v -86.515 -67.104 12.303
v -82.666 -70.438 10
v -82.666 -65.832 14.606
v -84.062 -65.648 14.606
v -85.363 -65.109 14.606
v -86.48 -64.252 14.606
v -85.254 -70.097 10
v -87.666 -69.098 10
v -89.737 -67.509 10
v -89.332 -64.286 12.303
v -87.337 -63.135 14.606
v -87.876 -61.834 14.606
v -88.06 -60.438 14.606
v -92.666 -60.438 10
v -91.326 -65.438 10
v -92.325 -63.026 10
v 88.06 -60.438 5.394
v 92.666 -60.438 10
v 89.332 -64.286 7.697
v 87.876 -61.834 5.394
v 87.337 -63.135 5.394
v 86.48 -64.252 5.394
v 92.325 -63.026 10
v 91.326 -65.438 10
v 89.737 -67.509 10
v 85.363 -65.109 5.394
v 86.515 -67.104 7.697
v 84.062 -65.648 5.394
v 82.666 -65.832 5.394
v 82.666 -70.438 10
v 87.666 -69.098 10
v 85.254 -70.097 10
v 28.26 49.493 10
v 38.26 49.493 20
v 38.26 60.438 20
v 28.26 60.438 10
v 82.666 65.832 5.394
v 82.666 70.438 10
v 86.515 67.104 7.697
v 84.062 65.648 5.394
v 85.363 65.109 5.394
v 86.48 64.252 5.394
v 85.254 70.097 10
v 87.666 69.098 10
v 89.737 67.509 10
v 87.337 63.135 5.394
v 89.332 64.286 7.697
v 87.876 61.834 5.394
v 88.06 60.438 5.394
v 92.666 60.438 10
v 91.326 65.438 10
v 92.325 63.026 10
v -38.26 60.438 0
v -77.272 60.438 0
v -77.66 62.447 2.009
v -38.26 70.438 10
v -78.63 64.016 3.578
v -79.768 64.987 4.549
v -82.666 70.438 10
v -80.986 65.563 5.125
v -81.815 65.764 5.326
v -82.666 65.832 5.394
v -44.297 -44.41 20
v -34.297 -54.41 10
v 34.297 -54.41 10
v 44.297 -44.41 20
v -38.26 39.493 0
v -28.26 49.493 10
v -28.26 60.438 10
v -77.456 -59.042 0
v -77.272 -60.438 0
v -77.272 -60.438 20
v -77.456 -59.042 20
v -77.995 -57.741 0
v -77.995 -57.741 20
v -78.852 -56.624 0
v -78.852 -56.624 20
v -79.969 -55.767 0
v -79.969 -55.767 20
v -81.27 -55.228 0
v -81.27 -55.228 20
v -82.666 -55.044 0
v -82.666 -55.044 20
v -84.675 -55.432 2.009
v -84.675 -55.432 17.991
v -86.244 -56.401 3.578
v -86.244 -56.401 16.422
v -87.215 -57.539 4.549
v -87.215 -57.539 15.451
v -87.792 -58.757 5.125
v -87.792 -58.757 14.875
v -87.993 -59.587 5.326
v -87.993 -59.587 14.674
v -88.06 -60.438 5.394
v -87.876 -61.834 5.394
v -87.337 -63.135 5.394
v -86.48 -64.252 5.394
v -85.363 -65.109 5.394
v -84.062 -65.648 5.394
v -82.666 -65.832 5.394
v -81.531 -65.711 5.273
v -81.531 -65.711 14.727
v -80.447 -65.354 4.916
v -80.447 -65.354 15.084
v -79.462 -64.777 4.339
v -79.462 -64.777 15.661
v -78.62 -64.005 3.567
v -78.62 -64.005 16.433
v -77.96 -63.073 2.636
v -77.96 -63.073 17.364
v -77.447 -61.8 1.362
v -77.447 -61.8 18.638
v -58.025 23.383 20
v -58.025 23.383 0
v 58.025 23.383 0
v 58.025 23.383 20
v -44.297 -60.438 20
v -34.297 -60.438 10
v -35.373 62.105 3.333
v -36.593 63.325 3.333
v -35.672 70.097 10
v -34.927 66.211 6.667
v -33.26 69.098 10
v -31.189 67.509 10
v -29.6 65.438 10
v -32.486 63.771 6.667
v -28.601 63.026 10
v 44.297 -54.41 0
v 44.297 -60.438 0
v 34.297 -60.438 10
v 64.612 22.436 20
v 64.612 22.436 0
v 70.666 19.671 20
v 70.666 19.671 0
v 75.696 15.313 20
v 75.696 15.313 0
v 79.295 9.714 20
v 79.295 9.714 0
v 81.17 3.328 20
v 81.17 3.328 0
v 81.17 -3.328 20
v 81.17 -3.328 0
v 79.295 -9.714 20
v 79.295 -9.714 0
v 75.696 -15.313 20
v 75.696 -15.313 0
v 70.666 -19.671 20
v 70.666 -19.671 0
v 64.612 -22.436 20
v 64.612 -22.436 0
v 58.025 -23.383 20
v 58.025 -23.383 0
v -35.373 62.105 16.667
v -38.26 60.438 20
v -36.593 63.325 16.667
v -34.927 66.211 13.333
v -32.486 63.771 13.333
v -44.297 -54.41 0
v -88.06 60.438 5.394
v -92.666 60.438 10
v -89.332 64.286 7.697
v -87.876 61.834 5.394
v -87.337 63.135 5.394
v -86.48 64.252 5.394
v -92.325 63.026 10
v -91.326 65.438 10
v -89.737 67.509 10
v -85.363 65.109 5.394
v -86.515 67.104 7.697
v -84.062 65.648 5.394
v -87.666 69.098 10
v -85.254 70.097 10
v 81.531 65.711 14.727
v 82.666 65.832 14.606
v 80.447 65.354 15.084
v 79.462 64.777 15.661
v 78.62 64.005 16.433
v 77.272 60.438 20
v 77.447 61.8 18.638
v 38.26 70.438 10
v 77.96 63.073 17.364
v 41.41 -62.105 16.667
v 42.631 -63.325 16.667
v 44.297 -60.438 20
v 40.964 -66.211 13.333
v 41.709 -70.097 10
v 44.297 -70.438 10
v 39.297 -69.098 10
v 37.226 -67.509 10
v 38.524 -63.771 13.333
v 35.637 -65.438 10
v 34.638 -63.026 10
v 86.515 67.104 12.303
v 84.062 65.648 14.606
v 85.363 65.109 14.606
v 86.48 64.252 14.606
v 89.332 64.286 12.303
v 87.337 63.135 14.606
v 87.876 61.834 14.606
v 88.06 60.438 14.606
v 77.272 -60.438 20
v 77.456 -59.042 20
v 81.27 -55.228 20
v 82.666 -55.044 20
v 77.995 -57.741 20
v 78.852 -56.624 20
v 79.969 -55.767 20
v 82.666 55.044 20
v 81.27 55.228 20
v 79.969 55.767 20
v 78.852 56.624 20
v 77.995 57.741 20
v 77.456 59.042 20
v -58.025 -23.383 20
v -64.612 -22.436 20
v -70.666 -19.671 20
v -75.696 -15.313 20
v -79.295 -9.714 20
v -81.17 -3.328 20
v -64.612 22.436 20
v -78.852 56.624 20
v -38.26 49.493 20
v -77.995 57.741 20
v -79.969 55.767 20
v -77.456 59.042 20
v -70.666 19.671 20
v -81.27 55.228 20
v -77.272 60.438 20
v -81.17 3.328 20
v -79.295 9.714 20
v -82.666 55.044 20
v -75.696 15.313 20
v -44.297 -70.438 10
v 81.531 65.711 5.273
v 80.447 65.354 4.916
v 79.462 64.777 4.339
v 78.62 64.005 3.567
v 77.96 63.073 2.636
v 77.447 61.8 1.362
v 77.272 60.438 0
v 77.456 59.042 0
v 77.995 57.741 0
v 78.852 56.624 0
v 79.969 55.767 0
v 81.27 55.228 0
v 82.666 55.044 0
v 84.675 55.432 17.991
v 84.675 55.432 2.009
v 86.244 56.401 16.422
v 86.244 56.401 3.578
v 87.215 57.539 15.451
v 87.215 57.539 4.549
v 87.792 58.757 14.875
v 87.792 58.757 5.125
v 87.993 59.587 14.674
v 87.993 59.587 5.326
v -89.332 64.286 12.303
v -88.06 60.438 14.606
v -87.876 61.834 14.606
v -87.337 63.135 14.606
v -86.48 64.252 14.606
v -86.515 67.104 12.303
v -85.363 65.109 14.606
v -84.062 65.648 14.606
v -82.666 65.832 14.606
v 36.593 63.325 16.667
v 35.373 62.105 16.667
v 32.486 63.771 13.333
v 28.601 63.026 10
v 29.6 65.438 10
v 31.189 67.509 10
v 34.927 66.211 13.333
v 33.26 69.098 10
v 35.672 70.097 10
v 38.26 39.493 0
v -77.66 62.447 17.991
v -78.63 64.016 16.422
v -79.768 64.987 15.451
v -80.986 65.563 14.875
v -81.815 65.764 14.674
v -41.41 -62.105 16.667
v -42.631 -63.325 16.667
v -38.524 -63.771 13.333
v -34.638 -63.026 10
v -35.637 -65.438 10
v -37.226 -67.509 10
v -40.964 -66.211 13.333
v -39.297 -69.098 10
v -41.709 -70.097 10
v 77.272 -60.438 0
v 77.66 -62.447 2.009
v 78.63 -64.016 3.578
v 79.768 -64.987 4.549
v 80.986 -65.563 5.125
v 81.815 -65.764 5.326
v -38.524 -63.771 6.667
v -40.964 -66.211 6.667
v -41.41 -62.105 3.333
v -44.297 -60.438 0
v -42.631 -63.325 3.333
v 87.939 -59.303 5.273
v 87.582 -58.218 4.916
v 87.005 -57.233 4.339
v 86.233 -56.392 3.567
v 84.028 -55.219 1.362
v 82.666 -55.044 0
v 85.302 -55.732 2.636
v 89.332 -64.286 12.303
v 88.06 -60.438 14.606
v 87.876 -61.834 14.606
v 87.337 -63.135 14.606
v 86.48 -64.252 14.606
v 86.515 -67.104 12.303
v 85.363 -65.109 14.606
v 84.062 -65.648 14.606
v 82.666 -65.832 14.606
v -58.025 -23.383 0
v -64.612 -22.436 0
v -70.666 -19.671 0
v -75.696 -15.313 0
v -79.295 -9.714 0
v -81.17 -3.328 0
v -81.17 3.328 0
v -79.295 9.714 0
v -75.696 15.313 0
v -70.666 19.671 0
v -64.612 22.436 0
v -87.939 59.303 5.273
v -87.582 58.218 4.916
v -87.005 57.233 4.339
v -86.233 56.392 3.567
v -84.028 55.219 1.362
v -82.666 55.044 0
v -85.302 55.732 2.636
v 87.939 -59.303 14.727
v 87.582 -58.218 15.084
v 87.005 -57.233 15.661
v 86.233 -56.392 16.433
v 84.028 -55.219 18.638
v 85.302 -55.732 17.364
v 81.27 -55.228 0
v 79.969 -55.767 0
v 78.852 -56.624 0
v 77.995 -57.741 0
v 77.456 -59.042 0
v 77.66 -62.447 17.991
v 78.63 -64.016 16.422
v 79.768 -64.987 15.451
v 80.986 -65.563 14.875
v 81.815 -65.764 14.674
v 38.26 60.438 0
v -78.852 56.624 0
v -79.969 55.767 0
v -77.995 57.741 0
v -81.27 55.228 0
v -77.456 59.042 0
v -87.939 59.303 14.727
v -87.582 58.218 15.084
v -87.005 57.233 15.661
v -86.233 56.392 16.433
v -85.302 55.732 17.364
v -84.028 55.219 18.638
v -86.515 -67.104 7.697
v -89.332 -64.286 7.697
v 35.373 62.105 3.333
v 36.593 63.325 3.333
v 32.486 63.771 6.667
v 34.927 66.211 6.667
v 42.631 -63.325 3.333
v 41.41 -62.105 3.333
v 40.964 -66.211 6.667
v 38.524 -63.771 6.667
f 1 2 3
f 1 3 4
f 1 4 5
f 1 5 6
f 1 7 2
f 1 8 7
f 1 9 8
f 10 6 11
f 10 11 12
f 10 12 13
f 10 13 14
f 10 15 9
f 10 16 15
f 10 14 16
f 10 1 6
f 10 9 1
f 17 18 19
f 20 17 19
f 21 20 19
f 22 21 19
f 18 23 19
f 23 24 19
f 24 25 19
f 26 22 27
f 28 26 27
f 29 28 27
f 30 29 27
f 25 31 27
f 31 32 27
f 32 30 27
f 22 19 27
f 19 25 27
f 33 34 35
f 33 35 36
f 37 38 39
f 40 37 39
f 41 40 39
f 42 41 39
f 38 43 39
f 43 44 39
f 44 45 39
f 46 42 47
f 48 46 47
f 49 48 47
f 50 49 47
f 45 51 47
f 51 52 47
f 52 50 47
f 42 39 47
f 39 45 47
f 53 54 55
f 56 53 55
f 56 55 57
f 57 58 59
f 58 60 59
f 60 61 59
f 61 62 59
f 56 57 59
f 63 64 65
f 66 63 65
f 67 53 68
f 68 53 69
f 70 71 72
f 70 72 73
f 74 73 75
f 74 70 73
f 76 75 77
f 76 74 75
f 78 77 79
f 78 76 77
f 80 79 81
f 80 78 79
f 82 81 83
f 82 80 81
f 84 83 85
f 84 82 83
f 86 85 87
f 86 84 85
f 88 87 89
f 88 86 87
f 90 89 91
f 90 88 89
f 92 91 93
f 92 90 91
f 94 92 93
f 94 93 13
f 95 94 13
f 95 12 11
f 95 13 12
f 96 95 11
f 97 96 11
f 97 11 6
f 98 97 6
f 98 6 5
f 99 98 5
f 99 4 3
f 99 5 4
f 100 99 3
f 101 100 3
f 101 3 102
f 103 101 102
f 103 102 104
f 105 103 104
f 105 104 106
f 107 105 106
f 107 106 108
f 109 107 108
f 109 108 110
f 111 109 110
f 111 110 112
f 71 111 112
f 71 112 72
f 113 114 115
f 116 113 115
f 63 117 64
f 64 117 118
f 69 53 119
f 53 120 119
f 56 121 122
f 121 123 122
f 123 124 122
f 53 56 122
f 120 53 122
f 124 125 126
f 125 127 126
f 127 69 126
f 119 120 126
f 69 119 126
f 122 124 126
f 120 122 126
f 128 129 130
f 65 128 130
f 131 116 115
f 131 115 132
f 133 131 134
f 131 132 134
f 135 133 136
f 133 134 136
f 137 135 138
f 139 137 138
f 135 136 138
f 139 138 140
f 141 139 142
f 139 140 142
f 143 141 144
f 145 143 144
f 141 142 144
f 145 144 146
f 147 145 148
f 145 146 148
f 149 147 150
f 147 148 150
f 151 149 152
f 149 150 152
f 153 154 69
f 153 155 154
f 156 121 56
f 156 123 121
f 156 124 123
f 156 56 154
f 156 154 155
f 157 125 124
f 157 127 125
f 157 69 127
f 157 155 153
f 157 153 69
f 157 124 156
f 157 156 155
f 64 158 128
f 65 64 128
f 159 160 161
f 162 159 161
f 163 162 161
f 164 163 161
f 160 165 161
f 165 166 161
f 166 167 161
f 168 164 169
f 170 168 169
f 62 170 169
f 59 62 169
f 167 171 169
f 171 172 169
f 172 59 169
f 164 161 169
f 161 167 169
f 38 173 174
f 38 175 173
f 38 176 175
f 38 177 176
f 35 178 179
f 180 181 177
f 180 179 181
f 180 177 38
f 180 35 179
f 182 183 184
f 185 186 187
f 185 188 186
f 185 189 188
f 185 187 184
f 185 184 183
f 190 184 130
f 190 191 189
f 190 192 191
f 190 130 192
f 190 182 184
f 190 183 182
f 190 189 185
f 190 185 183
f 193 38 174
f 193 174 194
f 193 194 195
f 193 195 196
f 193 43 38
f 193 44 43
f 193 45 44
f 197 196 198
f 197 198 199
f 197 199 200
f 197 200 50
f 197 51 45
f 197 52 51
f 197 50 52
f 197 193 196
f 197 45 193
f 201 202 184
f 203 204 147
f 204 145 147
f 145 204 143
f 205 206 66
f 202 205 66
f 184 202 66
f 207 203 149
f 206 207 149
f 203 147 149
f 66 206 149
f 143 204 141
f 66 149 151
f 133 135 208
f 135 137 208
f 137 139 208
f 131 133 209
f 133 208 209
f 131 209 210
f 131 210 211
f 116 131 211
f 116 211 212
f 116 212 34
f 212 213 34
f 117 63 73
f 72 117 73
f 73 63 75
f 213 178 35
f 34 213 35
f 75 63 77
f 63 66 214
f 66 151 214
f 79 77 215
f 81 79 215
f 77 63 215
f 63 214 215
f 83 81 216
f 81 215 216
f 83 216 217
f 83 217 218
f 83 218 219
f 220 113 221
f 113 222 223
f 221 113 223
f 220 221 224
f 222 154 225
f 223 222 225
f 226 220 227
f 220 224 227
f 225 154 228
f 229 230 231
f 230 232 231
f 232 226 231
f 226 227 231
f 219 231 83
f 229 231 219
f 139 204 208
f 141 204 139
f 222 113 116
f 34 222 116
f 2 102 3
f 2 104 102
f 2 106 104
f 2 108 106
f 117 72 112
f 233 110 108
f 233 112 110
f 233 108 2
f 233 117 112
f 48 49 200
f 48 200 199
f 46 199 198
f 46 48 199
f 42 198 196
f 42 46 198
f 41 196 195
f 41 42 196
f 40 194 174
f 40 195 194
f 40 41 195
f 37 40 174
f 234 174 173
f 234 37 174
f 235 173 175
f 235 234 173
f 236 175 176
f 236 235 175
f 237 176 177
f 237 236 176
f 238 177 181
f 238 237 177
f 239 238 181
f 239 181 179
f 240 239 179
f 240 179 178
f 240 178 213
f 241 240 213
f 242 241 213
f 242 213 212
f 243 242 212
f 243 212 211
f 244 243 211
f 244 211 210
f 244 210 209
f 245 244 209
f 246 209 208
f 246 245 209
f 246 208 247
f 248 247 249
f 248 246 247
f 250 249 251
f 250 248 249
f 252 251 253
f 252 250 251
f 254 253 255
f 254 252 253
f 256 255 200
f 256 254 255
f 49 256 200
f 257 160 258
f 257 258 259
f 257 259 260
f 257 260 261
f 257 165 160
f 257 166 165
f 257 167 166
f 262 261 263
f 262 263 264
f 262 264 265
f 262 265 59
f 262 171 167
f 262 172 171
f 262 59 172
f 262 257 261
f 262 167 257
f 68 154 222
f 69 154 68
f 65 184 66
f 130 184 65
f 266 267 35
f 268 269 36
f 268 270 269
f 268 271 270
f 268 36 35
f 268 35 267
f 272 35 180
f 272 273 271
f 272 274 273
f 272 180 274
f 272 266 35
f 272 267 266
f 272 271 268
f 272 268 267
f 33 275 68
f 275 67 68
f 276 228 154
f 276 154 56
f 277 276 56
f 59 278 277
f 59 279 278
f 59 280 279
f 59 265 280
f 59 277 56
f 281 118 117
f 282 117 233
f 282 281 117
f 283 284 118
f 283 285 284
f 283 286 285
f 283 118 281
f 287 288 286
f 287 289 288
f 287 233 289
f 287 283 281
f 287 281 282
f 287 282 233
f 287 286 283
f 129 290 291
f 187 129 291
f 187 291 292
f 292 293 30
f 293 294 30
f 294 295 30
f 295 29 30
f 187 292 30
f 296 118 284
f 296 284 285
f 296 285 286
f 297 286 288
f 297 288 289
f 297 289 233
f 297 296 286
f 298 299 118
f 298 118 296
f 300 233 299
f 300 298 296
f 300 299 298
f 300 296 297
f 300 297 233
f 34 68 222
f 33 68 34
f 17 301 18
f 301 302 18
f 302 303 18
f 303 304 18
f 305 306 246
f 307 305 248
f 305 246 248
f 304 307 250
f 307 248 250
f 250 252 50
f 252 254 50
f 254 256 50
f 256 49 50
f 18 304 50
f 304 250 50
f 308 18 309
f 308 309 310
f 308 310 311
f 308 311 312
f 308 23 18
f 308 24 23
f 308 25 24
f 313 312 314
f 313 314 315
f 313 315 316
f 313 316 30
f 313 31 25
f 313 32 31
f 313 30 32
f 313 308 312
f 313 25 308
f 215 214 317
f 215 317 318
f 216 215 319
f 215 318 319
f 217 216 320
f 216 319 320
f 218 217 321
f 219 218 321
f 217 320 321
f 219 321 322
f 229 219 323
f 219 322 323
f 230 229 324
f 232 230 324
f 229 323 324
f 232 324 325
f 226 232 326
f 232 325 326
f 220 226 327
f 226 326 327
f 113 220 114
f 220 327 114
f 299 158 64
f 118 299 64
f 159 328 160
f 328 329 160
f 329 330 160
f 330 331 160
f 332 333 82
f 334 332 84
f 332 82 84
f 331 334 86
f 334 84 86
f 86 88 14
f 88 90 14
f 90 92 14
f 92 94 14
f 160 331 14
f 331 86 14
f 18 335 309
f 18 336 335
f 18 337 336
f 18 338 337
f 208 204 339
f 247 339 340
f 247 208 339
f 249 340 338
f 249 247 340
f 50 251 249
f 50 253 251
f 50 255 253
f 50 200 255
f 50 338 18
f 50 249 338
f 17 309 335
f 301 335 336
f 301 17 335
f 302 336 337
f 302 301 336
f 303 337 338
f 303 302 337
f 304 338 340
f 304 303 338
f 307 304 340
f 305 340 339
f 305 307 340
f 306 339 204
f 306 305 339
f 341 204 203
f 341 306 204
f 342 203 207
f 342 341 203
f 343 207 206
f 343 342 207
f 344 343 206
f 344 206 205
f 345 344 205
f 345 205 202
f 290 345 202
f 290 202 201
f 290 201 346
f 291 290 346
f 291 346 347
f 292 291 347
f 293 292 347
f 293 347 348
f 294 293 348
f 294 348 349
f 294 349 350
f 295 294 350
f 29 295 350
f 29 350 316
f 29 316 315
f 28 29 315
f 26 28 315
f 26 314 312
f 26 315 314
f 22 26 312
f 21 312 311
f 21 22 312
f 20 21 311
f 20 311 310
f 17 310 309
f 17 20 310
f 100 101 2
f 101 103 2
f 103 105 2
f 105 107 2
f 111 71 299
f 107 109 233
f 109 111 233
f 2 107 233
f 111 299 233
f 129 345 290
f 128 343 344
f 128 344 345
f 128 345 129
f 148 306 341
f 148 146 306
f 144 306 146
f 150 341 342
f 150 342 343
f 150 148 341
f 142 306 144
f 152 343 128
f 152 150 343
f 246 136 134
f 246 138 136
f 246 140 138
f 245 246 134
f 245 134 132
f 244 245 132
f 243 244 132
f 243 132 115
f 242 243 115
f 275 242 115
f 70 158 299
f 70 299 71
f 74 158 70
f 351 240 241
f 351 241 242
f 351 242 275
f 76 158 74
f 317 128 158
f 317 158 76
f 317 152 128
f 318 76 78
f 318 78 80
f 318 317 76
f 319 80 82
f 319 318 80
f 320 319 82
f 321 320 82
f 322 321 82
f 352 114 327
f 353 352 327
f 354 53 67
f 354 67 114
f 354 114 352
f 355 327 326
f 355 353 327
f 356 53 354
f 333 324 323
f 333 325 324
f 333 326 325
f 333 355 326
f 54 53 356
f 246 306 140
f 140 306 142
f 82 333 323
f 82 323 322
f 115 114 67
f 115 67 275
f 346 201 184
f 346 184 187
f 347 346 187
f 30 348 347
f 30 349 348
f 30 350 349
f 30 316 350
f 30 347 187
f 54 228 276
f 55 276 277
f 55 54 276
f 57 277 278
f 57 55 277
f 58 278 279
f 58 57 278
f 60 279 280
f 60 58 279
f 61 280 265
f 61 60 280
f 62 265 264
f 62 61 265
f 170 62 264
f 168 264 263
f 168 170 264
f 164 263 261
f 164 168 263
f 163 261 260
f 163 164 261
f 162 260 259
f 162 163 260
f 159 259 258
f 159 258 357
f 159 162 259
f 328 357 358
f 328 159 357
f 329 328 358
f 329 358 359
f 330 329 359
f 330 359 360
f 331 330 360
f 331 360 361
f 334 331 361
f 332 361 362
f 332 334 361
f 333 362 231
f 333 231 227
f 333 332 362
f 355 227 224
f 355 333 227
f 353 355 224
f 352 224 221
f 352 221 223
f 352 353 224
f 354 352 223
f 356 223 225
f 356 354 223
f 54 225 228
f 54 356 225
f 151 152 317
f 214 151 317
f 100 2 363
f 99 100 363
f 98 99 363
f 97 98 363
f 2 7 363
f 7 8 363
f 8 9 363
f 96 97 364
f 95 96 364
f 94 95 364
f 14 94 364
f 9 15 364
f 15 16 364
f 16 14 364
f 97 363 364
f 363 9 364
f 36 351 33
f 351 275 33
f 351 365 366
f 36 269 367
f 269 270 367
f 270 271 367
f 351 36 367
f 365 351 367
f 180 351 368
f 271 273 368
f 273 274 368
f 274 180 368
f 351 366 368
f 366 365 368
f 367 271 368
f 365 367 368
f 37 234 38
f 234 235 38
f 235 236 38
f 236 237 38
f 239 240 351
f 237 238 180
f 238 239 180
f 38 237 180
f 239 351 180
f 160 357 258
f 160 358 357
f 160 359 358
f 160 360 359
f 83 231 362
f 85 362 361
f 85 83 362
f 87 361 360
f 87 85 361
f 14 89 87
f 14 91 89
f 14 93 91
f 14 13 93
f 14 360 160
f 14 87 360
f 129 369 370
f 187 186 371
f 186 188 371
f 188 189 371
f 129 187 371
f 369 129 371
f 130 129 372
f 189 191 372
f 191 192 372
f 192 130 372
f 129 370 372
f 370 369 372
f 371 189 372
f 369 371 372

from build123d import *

# Parameters (mm, degrees)
SKETCH2_R           = 5.393909569
BOSS_EXTRUDE1_DEPTH = 10
SKETCH2_2_R         = 5.393909569
BOSS_EXTRUDE2_DEPTH = 20
CHAMFER1_SIZE       = 10
CHAMFER3_SIZE       = 10
CHAMFER4_SIZE       = 10
CHAMFER5_SIZE       = 10
CHAMFER6_SIZE       = 10


with BuildPart() as part:
    # Sketch2 → Boss-Extrude1 (new body)
    with BuildSketch(Plane.XY):
        with BuildLine():
            Line((-82.666209824, 70.437866658), (-38.259856652, 70.437866658))
            ThreePointArc((-38.259856652, 70.437866658), (-31.18878884, 67.50893447), (-28.259856652, 60.437866658))
            Line((-28.259856652, 60.437866658), (-28.259856652, 49.492772702))
            Line((-28.259856652, 49.492772702), (28.259856652, 49.492772702))
            Line((28.259856652, 49.492772702), (28.259856652, 60.437866658))
            ThreePointArc((28.259856652, 60.437866658), (31.18878884, 67.50893447), (38.259856652, 70.437866658))
            Line((38.259856652, 70.437866658), (82.666209824, 70.437866658))
            ThreePointArc((82.666209824, 70.437866658), (89.737277636, 67.50893447), (92.666209824, 60.437866658))
            Line((92.666209824, 60.437866658), (92.666209824, -60.437866658))
            ThreePointArc((92.666209824, -60.437866658), (89.737277636, -67.50893447), (82.666209824, -70.437866658))
            Line((82.666209824, -70.437866658), (44.297191223, -70.437866658))
            ThreePointArc((44.297191223, -70.437866658), (37.226123411, -67.50893447), (34.297191223, -60.437866658))
            Line((34.297191223, -60.437866658), (34.297191223, -54.409741631))
            Line((34.297191223, -54.409741631), (-34.297191223, -54.409741631))
            Line((-34.297191223, -54.409741631), (-34.297191223, -60.437866658))
            ThreePointArc((-34.297191223, -60.437866658), (-37.226123411, -67.50893447), (-44.297191223, -70.437866658))
            Line((-44.297191223, -70.437866658), (-82.666209824, -70.437866658))
            ThreePointArc((-82.666209824, -70.437866658), (-89.737277636, -67.50893447), (-92.666209824, -60.437866658))
            Line((-92.666209824, -60.437866658), (-92.666209824, 60.437866658))
            ThreePointArc((-92.666209824, 60.437866658), (-89.737277636, 67.50893447), (-82.666209824, 70.437866658))
        make_face()
        with Locations((82.666209824, -60.437866658)):
            Circle(SKETCH2_R, mode=Mode.SUBTRACT)
        with Locations((82.666209824, 60.437866658)):
            Circle(SKETCH2_R, mode=Mode.SUBTRACT)
        with Locations((-82.666209824, 60.437866658)):
            Circle(SKETCH2_R, mode=Mode.SUBTRACT)
        with Locations((-82.666209824, -60.437866658)):
            Circle(SKETCH2_R, mode=Mode.SUBTRACT)
        with BuildLine():
            Line((-58.024636058, 23.383062292), (58.024636058, 23.383062292))
            ThreePointArc((58.024636058, 23.383062292), (81.40769835, 0), (58.024636058, -23.383062292))
            Line((58.024636058, -23.383062292), (-58.024636058, -23.383062292))
            ThreePointArc((-58.024636058, -23.383062292), (-81.40769835, 0), (-58.024636058, 23.383062292))
        make_face(mode=Mode.SUBTRACT)
    extrude(amount=BOSS_EXTRUDE1_DEPTH)

    # Sketch2<2> → Boss-Extrude2 (add)
    with BuildSketch(Plane.XY):
        with BuildLine():
            Line((-82.666209824, 70.437866658), (-38.259856652, 70.437866658))
            ThreePointArc((-38.259856652, 70.437866658), (-31.18878884, 67.50893447), (-28.259856652, 60.437866658))
            Line((-28.259856652, 60.437866658), (-28.259856652, 49.492772702))
            Line((-28.259856652, 49.492772702), (28.259856652, 49.492772702))
            Line((28.259856652, 49.492772702), (28.259856652, 60.437866658))
            ThreePointArc((28.259856652, 60.437866658), (31.18878884, 67.50893447), (38.259856652, 70.437866658))
            Line((38.259856652, 70.437866658), (82.666209824, 70.437866658))
            ThreePointArc((82.666209824, 70.437866658), (89.737277636, 67.50893447), (92.666209824, 60.437866658))
            Line((92.666209824, 60.437866658), (92.666209824, -60.437866658))
            ThreePointArc((92.666209824, -60.437866658), (89.737277636, -67.50893447), (82.666209824, -70.437866658))
            Line((82.666209824, -70.437866658), (44.297191223, -70.437866658))
            ThreePointArc((44.297191223, -70.437866658), (37.226123411, -67.50893447), (34.297191223, -60.437866658))
            Line((34.297191223, -60.437866658), (34.297191223, -54.409741631))
            Line((34.297191223, -54.409741631), (-34.297191223, -54.409741631))
            Line((-34.297191223, -54.409741631), (-34.297191223, -60.437866658))
            ThreePointArc((-34.297191223, -60.437866658), (-37.226123411, -67.50893447), (-44.297191223, -70.437866658))
            Line((-44.297191223, -70.437866658), (-82.666209824, -70.437866658))
            ThreePointArc((-82.666209824, -70.437866658), (-89.737277636, -67.50893447), (-92.666209824, -60.437866658))
            Line((-92.666209824, -60.437866658), (-92.666209824, 60.437866658))
            ThreePointArc((-92.666209824, 60.437866658), (-89.737277636, 67.50893447), (-82.666209824, 70.437866658))
        make_face()
        with Locations((82.666209824, -60.437866658)):
            Circle(SKETCH2_2_R, mode=Mode.SUBTRACT)
        with Locations((82.666209824, 60.437866658)):
            Circle(SKETCH2_2_R, mode=Mode.SUBTRACT)
        with Locations((-82.666209824, 60.437866658)):
            Circle(SKETCH2_2_R, mode=Mode.SUBTRACT)
        with Locations((-82.666209824, -60.437866658)):
            Circle(SKETCH2_2_R, mode=Mode.SUBTRACT)
        with BuildLine():
            Line((-58.024636058, 23.383062292), (58.024636058, 23.383062292))
            ThreePointArc((58.024636058, 23.383062292), (81.40769835, 0), (58.024636058, -23.383062292))
            Line((58.024636058, -23.383062292), (-58.024636058, -23.383062292))
            ThreePointArc((-58.024636058, -23.383062292), (-81.40769835, 0), (-58.024636058, 23.383062292))
        make_face(mode=Mode.SUBTRACT)
    extrude(amount=BOSS_EXTRUDE2_DEPTH)

    # Chamfer1
    # the kernel refuses this chamfer: 10 mm, written as the material it takes off along each edge
    with BuildSketch(Plane(origin=(82.666209824, -70.437866658, 0), x_dir=(0, 1, 0), z_dir=(-1, 0, 0))) as chamfer1_piece_1:
        Polygon((CHAMFER1_SIZE, 0), (0, -CHAMFER1_SIZE), (0, 0), align=None)
    extrude(amount=38.369018602, mode=Mode.SUBTRACT)
    with BuildSketch(Plane(origin=(44.297191223, -60.437866658, 0), x_dir=(0, -1, 0), z_dir=(1, 0, 0))) as chamfer1_piece_2:
        Polygon((10 - CHAMFER1_SIZE, 0), (10, -CHAMFER1_SIZE), (10, 0), align=None)
    revolve(axis=Axis((44.297191223, -60.437866658, 0), (0, 0, -1)), revolution_arc=90, mode=Mode.SUBTRACT)
    with BuildSketch(Plane(origin=(34.297191223, -60.437866658, 0), x_dir=(1, 0, 0), z_dir=(0, 1, 0))) as chamfer1_piece_3:
        Polygon((CHAMFER1_SIZE, 0), (0, -CHAMFER1_SIZE), (0, 0), align=None)
    extrude(amount=6.028125027, mode=Mode.SUBTRACT)
    with BuildSketch(Plane(origin=(-28.259856652, 49.492772702, 0), x_dir=(0, -1, 0), z_dir=(1, 0, 0))) as chamfer1_piece_4:
        Polygon((CHAMFER1_SIZE, 0), (0, -CHAMFER1_SIZE), (0, 0), align=None)
    extrude(amount=56.519713304, mode=Mode.SUBTRACT)
    with BuildSketch(Plane(origin=(28.259856652, 49.492772702, 0), x_dir=(1, 0, 0), z_dir=(0, 1, 0))) as chamfer1_piece_5:
        Polygon((CHAMFER1_SIZE, 0), (0, -CHAMFER1_SIZE), (0, 0), align=None)
    extrude(amount=10.945093956, mode=Mode.SUBTRACT)
    with BuildSketch(Plane(origin=(38.259856652, 60.437866658, 0), x_dir=(-1, 0, 0), z_dir=(0, -1, 0))) as chamfer1_piece_6:
        Polygon((10 - CHAMFER1_SIZE, 0), (10, -CHAMFER1_SIZE), (10, 0), align=None)
    revolve(axis=Axis((38.259856652, 60.437866658, 0), (0, 0, -1)), revolution_arc=90, mode=Mode.SUBTRACT)
    with BuildSketch(Plane(origin=(38.259856652, 70.437866658, 0), x_dir=(0, -1, 0), z_dir=(1, 0, 0))) as chamfer1_piece_7:
        Polygon((CHAMFER1_SIZE, 0), (0, -CHAMFER1_SIZE), (0, 0), align=None)
    extrude(amount=44.406353173, mode=Mode.SUBTRACT)
    with BuildSketch(Plane(origin=(82.666209824, 60.437866658, 0), x_dir=(0, 1, 0), z_dir=(-1, 0, 0))) as chamfer1_piece_8:
        Polygon((10 - CHAMFER1_SIZE, 0), (10, -CHAMFER1_SIZE), (10, 0), align=None)
    revolve(axis=Axis((82.666209824, 60.437866658, 0), (0, 0, -1)), revolution_arc=90, mode=Mode.SUBTRACT)
    with BuildSketch(Plane(origin=(92.666209824, 60.437866658, 0), x_dir=(-1, 0, 0), z_dir=(0, -1, 0))) as chamfer1_piece_9:
        Polygon((CHAMFER1_SIZE, 0), (0, -CHAMFER1_SIZE), (0, 0), align=None)
    extrude(amount=120.875733316, mode=Mode.SUBTRACT)
    with BuildSketch(Plane(origin=(82.666209824, -60.437866658, 0), x_dir=(1, 0, 0), z_dir=(0, 1, 0))) as chamfer1_piece_10:
        Polygon((10 - CHAMFER1_SIZE, 0), (10, -CHAMFER1_SIZE), (10, 0), align=None)
    revolve(axis=Axis((82.666209824, -60.437866658, 0), (0, 0, -1)), revolution_arc=90, mode=Mode.SUBTRACT)
    with BuildSketch(Plane(origin=(-28.259856652, 49.492772702, 0), x_dir=(0, -1, 0), z_dir=(1, 0, 0))) as chamfer1_piece_11a_section:
        Polygon((CHAMFER1_SIZE, 0), (0, -CHAMFER1_SIZE), (0, 0), align=None)
    chamfer1_piece_11a = extrude(amount=82.236543183, mode=Mode.PRIVATE)
    chamfer1_piece_11a = split(chamfer1_piece_11a, bisect_by=Plane(origin=(28.259856652, 49.492772702, 0), z_dir=(1, 0, 0)), keep=Keep.TOP, mode=Mode.PRIVATE)
    with BuildSketch(Plane(origin=(28.259856652, 23.775942822, 0), x_dir=(1, 0, 0), z_dir=(0, 1, 0))) as chamfer1_piece_11b_section:
        Polygon((CHAMFER1_SIZE, 0), (0, -CHAMFER1_SIZE), (0, 0), align=None)
    chamfer1_piece_11b = extrude(amount=36.661923835, mode=Mode.PRIVATE)
    chamfer1_piece_11b = split(chamfer1_piece_11b, bisect_by=Plane(origin=(28.259856652, 49.492772702, 0), z_dir=(0, -1, 0)), keep=Keep.TOP, mode=Mode.PRIVATE)
    chamfer1_piece_11 = chamfer1_piece_11a & chamfer1_piece_11b
    add(chamfer1_piece_11, mode=Mode.SUBTRACT)

    # Chamfer3
    # the kernel refuses this chamfer: 10 mm, written as the material it takes off along each edge
    with BuildSketch(Plane(origin=(-34.297191223, -54.409741631, 0), x_dir=(-1, 0, 0), z_dir=(0, -1, 0))) as chamfer3_piece_1:
        Polygon((CHAMFER3_SIZE, 0), (0, -CHAMFER3_SIZE), (0, 0), align=None)
    extrude(amount=6.028125027, mode=Mode.SUBTRACT)
    with BuildSketch(Plane(origin=(-44.297191223, -60.437866658, 0), x_dir=(1, 0, 0), z_dir=(0, 1, 0))) as chamfer3_piece_2:
        Polygon((10, -CHAMFER3_SIZE), (10 - CHAMFER3_SIZE, 0), (10, 0), align=None)
    revolve(axis=Axis((-44.297191223, -60.437866658, 0), (0, 0, -1)), revolution_arc=90, mode=Mode.SUBTRACT)
    with BuildSketch(Plane(origin=(-44.297191223, -70.437866658, 0), x_dir=(0, 1, 0), z_dir=(-1, 0, 0))) as chamfer3_piece_3:
        Polygon((CHAMFER3_SIZE, 0), (0, -CHAMFER3_SIZE), (0, 0), align=None)
    extrude(amount=38.369018602, mode=Mode.SUBTRACT)
    with BuildSketch(Plane(origin=(-82.666209824, -60.437866658, 0), x_dir=(0, -1, 0), z_dir=(1, 0, 0))) as chamfer3_piece_4:
        Polygon((10 - CHAMFER3_SIZE, 0), (10, -CHAMFER3_SIZE), (10, 0), align=None)
    revolve(axis=Axis((-82.666209824, -60.437866658, 0), (0, 0, -1)), revolution_arc=90, mode=Mode.SUBTRACT)
    with BuildSketch(Plane(origin=(-92.666209824, -60.437866658, 0), x_dir=(1, 0, 0), z_dir=(0, 1, 0))) as chamfer3_piece_5:
        Polygon((CHAMFER3_SIZE, 0), (0, -CHAMFER3_SIZE), (0, 0), align=None)
    extrude(amount=120.875733316, mode=Mode.SUBTRACT)
    with BuildSketch(Plane(origin=(-82.666209824, 60.437866658, 0), x_dir=(-1, 0, 0), z_dir=(0, -1, 0))) as chamfer3_piece_6:
        Polygon((10 - CHAMFER3_SIZE, 0), (10, -CHAMFER3_SIZE), (10, 0), align=None)
    revolve(axis=Axis((-82.666209824, 60.437866658, 0), (0, 0, -1)), revolution_arc=90, mode=Mode.SUBTRACT)
    with BuildSketch(Plane(origin=(-82.666209824, 70.437866658, 0), x_dir=(0, -1, 0), z_dir=(1, 0, 0))) as chamfer3_piece_7:
        Polygon((CHAMFER3_SIZE, 0), (0, -CHAMFER3_SIZE), (0, 0), align=None)
    extrude(amount=44.406353173, mode=Mode.SUBTRACT)
    with BuildSketch(Plane(origin=(-38.259856652, 60.437866658, 0), x_dir=(0, 1, 0), z_dir=(-1, 0, 0))) as chamfer3_piece_8:
        Polygon((10 - CHAMFER3_SIZE, 0), (10, -CHAMFER3_SIZE), (10, 0), align=None)
    revolve(axis=Axis((-38.259856652, 60.437866658, 0), (0, 0, -1)), revolution_arc=90, mode=Mode.SUBTRACT)
    with BuildSketch(Plane(origin=(-28.259856652, 60.437866658, 0), x_dir=(-1, 0, 0), z_dir=(0, -1, 0))) as chamfer3_piece_9_section:
        Polygon((CHAMFER3_SIZE, 0), (0, -CHAMFER3_SIZE), (0, 0), align=None)
    chamfer3_piece_9 = extrude(amount=46.661923835, mode=Mode.PRIVATE)
    chamfer3_piece_9 = split(chamfer3_piece_9, bisect_by=Plane(origin=(-28.259856652, 49.492772702, 0), z_dir=(0, 1, 0)), keep=Keep.TOP, mode=Mode.PRIVATE)
    chamfer3_piece_9 = split(chamfer3_piece_9, bisect_by=Plane(origin=(-28.259856652, 49.96531968, 10.472546978), z_dir=(0, 0.7071067811865476, -0.7071067811865476)), keep=Keep.TOP, mode=Mode.PRIVATE)
    add(chamfer3_piece_9, mode=Mode.SUBTRACT)
    with BuildSketch(Plane(origin=(-28.259856652, 60.437866658, 0), x_dir=(-1, 0, 0), z_dir=(0, -1, 0))) as chamfer3_piece_10_section:
        Polygon((CHAMFER3_SIZE, 0), (0, -CHAMFER3_SIZE), (0, 0), align=None)
    chamfer3_piece_10 = extrude(amount=46.661923835, mode=Mode.PRIVATE)
    chamfer3_piece_10 = split(chamfer3_piece_10, bisect_by=Plane(origin=(-28.259856652, 49.492772702, 0), z_dir=(0, -1, 0)), keep=Keep.TOP, mode=Mode.PRIVATE)
    chamfer3_piece_10 = split(chamfer3_piece_10, bisect_by=Plane(origin=(-28.259856652, 49.96531968, 10.472546978), z_dir=(0, 0.7071067811865476, -0.7071067811865476)), keep=Keep.TOP, mode=Mode.PRIVATE)
    add(chamfer3_piece_10, mode=Mode.SUBTRACT)

    # Chamfer4
    # the kernel refuses this chamfer: 10 mm, written as the material it takes off along each edge
    with BuildSketch(Plane(origin=(28.259856652, 49.492772702, 20), x_dir=(1, 0, 0), z_dir=(0, 1, 0))) as chamfer4_piece_1:
        Polygon((CHAMFER4_SIZE, 0), (0, CHAMFER4_SIZE), (0, 0), align=None)
    extrude(amount=10.945093956, mode=Mode.SUBTRACT)
    with BuildSketch(Plane(origin=(38.259856652, 60.437866658, 20), x_dir=(-1, 0, 0), z_dir=(0, -1, 0))) as chamfer4_piece_2:
        Polygon((10 - CHAMFER4_SIZE, 0), (10, CHAMFER4_SIZE), (10, 0), align=None)
    revolve(axis=Axis((38.259856652, 60.437866658, 20), (0, 0, -1)), revolution_arc=90, mode=Mode.SUBTRACT)
    with BuildSketch(Plane(origin=(38.259856652, 70.437866658, 20), x_dir=(0, -1, 0), z_dir=(1, 0, 0))) as chamfer4_piece_3:
        Polygon((CHAMFER4_SIZE, 0), (0, CHAMFER4_SIZE), (0, 0), align=None)
    extrude(amount=44.406353173, mode=Mode.SUBTRACT)
    with BuildSketch(Plane(origin=(82.666209824, 60.437866658, 20), x_dir=(0, 1, 0), z_dir=(-1, 0, 0))) as chamfer4_piece_4:
        Polygon((10 - CHAMFER4_SIZE, 0), (10, CHAMFER4_SIZE), (10, 0), align=None)
    revolve(axis=Axis((82.666209824, 60.437866658, 20), (0, 0, -1)), revolution_arc=90, mode=Mode.SUBTRACT)
    with BuildSketch(Plane(origin=(92.666209824, 60.437866658, 20), x_dir=(-1, 0, 0), z_dir=(0, -1, 0))) as chamfer4_piece_5:
        Polygon((CHAMFER4_SIZE, 0), (0, CHAMFER4_SIZE), (0, 0), align=None)
    extrude(amount=120.875733316, mode=Mode.SUBTRACT)
    with BuildSketch(Plane(origin=(82.666209824, -60.437866658, 20), x_dir=(1, 0, 0), z_dir=(0, 1, 0))) as chamfer4_piece_6:
        Polygon((10 - CHAMFER4_SIZE, 0), (10, CHAMFER4_SIZE), (10, 0), align=None)
    revolve(axis=Axis((82.666209824, -60.437866658, 20), (0, 0, -1)), revolution_arc=90, mode=Mode.SUBTRACT)
    with BuildSketch(Plane(origin=(82.666209824, -70.437866658, 20), x_dir=(0, 1, 0), z_dir=(-1, 0, 0))) as chamfer4_piece_7:
        Polygon((CHAMFER4_SIZE, 0), (0, CHAMFER4_SIZE), (0, 0), align=None)
    extrude(amount=38.369018602, mode=Mode.SUBTRACT)
    with BuildSketch(Plane(origin=(44.297191223, -60.437866658, 20), x_dir=(0, -1, 0), z_dir=(1, 0, 0))) as chamfer4_piece_8:
        Polygon((10 - CHAMFER4_SIZE, 0), (10, CHAMFER4_SIZE), (10, 0), align=None)
    revolve(axis=Axis((44.297191223, -60.437866658, 20), (0, 0, -1)), revolution_arc=90, mode=Mode.SUBTRACT)
    with BuildSketch(Plane(origin=(34.297191223, -60.437866658, 20), x_dir=(1, 0, 0), z_dir=(0, 1, 0))) as chamfer4_piece_9:
        Polygon((CHAMFER4_SIZE, 0), (0, CHAMFER4_SIZE), (0, 0), align=None)
    extrude(amount=6.028125027, mode=Mode.SUBTRACT)

    # Chamfer5
    chamfer5_edges = [part.edges().sort_by_distance(p)[0] for p in [
        (5, -54.409741631, 20),
    ]]
    chamfer(chamfer5_edges, length=CHAMFER5_SIZE)

    # Chamfer6
    # the kernel refuses this chamfer: 10 mm, written as the material it takes off along each edge
    with BuildSketch(Plane(origin=(-28.259856652, 60.437866658, 20), x_dir=(-1, 0, 0), z_dir=(0, -1, 0))) as chamfer6_piece_1:
        Polygon((CHAMFER6_SIZE, 0), (0, CHAMFER6_SIZE), (0, 0), align=None)
    extrude(amount=10.945093956, mode=Mode.SUBTRACT)
    with BuildSketch(Plane(origin=(-38.259856652, 60.437866658, 20), x_dir=(0, 1, 0), z_dir=(-1, 0, 0))) as chamfer6_piece_2:
        Polygon((10 - CHAMFER6_SIZE, 0), (10, CHAMFER6_SIZE), (10, 0), align=None)
    revolve(axis=Axis((-38.259856652, 60.437866658, 20), (0, 0, -1)), revolution_arc=90, mode=Mode.SUBTRACT)
    with BuildSketch(Plane(origin=(-82.666209824, 70.437866658, 20), x_dir=(0, -1, 0), z_dir=(1, 0, 0))) as chamfer6_piece_3:
        Polygon((CHAMFER6_SIZE, 0), (0, CHAMFER6_SIZE), (0, 0), align=None)
    extrude(amount=44.406353173, mode=Mode.SUBTRACT)
    with BuildSketch(Plane(origin=(-82.666209824, 60.437866658, 20), x_dir=(-1, 0, 0), z_dir=(0, -1, 0))) as chamfer6_piece_4:
        Polygon((10 - CHAMFER6_SIZE, 0), (10, CHAMFER6_SIZE), (10, 0), align=None)
    revolve(axis=Axis((-82.666209824, 60.437866658, 20), (0, 0, -1)), revolution_arc=90, mode=Mode.SUBTRACT)
    with BuildSketch(Plane(origin=(-92.666209824, -60.437866658, 20), x_dir=(1, 0, 0), z_dir=(0, 1, 0))) as chamfer6_piece_5:
        Polygon((CHAMFER6_SIZE, 0), (0, CHAMFER6_SIZE), (0, 0), align=None)
    extrude(amount=120.875733316, mode=Mode.SUBTRACT)
    with BuildSketch(Plane(origin=(-82.666209824, -60.437866658, 20), x_dir=(0, -1, 0), z_dir=(1, 0, 0))) as chamfer6_piece_6:
        Polygon((10 - CHAMFER6_SIZE, 0), (10, CHAMFER6_SIZE), (10, 0), align=None)
    revolve(axis=Axis((-82.666209824, -60.437866658, 20), (0, 0, -1)), revolution_arc=90, mode=Mode.SUBTRACT)
    with BuildSketch(Plane(origin=(-44.297191223, -70.437866658, 20), x_dir=(0, 1, 0), z_dir=(-1, 0, 0))) as chamfer6_piece_7:
        Polygon((CHAMFER6_SIZE, 0), (0, CHAMFER6_SIZE), (0, 0), align=None)
    extrude(amount=38.369018602, mode=Mode.SUBTRACT)
    with BuildSketch(Plane(origin=(-44.297191223, -60.437866658, 20), x_dir=(1, 0, 0), z_dir=(0, 1, 0))) as chamfer6_piece_8:
        Polygon((10 - CHAMFER6_SIZE, 0), (10, CHAMFER6_SIZE), (10, 0), align=None)
    revolve(axis=Axis((-44.297191223, -60.437866658, 20), (0, 0, -1)), revolution_arc=90, mode=Mode.SUBTRACT)
    with BuildSketch(Plane(origin=(-34.297191223, -60.437866658, 20), x_dir=(-1, 0, 0), z_dir=(0, 1, 0))) as chamfer6_piece_9_section:
        Polygon((CHAMFER6_SIZE, 0), (0, -CHAMFER6_SIZE), (0, 0), align=None)
    chamfer6_piece_9 = extrude(amount=41.744954906, mode=Mode.PRIVATE)
    chamfer6_piece_9 = split(chamfer6_piece_9, bisect_by=Plane(origin=(-34.297191223, -52.423804144, 11.985937487), z_dir=(0, -0.7071067811865476, 0.7071067811865476)), keep=Keep.TOP, mode=Mode.PRIVATE)
    add(chamfer6_piece_9, mode=Mode.SUBTRACT)


solid = part.part
